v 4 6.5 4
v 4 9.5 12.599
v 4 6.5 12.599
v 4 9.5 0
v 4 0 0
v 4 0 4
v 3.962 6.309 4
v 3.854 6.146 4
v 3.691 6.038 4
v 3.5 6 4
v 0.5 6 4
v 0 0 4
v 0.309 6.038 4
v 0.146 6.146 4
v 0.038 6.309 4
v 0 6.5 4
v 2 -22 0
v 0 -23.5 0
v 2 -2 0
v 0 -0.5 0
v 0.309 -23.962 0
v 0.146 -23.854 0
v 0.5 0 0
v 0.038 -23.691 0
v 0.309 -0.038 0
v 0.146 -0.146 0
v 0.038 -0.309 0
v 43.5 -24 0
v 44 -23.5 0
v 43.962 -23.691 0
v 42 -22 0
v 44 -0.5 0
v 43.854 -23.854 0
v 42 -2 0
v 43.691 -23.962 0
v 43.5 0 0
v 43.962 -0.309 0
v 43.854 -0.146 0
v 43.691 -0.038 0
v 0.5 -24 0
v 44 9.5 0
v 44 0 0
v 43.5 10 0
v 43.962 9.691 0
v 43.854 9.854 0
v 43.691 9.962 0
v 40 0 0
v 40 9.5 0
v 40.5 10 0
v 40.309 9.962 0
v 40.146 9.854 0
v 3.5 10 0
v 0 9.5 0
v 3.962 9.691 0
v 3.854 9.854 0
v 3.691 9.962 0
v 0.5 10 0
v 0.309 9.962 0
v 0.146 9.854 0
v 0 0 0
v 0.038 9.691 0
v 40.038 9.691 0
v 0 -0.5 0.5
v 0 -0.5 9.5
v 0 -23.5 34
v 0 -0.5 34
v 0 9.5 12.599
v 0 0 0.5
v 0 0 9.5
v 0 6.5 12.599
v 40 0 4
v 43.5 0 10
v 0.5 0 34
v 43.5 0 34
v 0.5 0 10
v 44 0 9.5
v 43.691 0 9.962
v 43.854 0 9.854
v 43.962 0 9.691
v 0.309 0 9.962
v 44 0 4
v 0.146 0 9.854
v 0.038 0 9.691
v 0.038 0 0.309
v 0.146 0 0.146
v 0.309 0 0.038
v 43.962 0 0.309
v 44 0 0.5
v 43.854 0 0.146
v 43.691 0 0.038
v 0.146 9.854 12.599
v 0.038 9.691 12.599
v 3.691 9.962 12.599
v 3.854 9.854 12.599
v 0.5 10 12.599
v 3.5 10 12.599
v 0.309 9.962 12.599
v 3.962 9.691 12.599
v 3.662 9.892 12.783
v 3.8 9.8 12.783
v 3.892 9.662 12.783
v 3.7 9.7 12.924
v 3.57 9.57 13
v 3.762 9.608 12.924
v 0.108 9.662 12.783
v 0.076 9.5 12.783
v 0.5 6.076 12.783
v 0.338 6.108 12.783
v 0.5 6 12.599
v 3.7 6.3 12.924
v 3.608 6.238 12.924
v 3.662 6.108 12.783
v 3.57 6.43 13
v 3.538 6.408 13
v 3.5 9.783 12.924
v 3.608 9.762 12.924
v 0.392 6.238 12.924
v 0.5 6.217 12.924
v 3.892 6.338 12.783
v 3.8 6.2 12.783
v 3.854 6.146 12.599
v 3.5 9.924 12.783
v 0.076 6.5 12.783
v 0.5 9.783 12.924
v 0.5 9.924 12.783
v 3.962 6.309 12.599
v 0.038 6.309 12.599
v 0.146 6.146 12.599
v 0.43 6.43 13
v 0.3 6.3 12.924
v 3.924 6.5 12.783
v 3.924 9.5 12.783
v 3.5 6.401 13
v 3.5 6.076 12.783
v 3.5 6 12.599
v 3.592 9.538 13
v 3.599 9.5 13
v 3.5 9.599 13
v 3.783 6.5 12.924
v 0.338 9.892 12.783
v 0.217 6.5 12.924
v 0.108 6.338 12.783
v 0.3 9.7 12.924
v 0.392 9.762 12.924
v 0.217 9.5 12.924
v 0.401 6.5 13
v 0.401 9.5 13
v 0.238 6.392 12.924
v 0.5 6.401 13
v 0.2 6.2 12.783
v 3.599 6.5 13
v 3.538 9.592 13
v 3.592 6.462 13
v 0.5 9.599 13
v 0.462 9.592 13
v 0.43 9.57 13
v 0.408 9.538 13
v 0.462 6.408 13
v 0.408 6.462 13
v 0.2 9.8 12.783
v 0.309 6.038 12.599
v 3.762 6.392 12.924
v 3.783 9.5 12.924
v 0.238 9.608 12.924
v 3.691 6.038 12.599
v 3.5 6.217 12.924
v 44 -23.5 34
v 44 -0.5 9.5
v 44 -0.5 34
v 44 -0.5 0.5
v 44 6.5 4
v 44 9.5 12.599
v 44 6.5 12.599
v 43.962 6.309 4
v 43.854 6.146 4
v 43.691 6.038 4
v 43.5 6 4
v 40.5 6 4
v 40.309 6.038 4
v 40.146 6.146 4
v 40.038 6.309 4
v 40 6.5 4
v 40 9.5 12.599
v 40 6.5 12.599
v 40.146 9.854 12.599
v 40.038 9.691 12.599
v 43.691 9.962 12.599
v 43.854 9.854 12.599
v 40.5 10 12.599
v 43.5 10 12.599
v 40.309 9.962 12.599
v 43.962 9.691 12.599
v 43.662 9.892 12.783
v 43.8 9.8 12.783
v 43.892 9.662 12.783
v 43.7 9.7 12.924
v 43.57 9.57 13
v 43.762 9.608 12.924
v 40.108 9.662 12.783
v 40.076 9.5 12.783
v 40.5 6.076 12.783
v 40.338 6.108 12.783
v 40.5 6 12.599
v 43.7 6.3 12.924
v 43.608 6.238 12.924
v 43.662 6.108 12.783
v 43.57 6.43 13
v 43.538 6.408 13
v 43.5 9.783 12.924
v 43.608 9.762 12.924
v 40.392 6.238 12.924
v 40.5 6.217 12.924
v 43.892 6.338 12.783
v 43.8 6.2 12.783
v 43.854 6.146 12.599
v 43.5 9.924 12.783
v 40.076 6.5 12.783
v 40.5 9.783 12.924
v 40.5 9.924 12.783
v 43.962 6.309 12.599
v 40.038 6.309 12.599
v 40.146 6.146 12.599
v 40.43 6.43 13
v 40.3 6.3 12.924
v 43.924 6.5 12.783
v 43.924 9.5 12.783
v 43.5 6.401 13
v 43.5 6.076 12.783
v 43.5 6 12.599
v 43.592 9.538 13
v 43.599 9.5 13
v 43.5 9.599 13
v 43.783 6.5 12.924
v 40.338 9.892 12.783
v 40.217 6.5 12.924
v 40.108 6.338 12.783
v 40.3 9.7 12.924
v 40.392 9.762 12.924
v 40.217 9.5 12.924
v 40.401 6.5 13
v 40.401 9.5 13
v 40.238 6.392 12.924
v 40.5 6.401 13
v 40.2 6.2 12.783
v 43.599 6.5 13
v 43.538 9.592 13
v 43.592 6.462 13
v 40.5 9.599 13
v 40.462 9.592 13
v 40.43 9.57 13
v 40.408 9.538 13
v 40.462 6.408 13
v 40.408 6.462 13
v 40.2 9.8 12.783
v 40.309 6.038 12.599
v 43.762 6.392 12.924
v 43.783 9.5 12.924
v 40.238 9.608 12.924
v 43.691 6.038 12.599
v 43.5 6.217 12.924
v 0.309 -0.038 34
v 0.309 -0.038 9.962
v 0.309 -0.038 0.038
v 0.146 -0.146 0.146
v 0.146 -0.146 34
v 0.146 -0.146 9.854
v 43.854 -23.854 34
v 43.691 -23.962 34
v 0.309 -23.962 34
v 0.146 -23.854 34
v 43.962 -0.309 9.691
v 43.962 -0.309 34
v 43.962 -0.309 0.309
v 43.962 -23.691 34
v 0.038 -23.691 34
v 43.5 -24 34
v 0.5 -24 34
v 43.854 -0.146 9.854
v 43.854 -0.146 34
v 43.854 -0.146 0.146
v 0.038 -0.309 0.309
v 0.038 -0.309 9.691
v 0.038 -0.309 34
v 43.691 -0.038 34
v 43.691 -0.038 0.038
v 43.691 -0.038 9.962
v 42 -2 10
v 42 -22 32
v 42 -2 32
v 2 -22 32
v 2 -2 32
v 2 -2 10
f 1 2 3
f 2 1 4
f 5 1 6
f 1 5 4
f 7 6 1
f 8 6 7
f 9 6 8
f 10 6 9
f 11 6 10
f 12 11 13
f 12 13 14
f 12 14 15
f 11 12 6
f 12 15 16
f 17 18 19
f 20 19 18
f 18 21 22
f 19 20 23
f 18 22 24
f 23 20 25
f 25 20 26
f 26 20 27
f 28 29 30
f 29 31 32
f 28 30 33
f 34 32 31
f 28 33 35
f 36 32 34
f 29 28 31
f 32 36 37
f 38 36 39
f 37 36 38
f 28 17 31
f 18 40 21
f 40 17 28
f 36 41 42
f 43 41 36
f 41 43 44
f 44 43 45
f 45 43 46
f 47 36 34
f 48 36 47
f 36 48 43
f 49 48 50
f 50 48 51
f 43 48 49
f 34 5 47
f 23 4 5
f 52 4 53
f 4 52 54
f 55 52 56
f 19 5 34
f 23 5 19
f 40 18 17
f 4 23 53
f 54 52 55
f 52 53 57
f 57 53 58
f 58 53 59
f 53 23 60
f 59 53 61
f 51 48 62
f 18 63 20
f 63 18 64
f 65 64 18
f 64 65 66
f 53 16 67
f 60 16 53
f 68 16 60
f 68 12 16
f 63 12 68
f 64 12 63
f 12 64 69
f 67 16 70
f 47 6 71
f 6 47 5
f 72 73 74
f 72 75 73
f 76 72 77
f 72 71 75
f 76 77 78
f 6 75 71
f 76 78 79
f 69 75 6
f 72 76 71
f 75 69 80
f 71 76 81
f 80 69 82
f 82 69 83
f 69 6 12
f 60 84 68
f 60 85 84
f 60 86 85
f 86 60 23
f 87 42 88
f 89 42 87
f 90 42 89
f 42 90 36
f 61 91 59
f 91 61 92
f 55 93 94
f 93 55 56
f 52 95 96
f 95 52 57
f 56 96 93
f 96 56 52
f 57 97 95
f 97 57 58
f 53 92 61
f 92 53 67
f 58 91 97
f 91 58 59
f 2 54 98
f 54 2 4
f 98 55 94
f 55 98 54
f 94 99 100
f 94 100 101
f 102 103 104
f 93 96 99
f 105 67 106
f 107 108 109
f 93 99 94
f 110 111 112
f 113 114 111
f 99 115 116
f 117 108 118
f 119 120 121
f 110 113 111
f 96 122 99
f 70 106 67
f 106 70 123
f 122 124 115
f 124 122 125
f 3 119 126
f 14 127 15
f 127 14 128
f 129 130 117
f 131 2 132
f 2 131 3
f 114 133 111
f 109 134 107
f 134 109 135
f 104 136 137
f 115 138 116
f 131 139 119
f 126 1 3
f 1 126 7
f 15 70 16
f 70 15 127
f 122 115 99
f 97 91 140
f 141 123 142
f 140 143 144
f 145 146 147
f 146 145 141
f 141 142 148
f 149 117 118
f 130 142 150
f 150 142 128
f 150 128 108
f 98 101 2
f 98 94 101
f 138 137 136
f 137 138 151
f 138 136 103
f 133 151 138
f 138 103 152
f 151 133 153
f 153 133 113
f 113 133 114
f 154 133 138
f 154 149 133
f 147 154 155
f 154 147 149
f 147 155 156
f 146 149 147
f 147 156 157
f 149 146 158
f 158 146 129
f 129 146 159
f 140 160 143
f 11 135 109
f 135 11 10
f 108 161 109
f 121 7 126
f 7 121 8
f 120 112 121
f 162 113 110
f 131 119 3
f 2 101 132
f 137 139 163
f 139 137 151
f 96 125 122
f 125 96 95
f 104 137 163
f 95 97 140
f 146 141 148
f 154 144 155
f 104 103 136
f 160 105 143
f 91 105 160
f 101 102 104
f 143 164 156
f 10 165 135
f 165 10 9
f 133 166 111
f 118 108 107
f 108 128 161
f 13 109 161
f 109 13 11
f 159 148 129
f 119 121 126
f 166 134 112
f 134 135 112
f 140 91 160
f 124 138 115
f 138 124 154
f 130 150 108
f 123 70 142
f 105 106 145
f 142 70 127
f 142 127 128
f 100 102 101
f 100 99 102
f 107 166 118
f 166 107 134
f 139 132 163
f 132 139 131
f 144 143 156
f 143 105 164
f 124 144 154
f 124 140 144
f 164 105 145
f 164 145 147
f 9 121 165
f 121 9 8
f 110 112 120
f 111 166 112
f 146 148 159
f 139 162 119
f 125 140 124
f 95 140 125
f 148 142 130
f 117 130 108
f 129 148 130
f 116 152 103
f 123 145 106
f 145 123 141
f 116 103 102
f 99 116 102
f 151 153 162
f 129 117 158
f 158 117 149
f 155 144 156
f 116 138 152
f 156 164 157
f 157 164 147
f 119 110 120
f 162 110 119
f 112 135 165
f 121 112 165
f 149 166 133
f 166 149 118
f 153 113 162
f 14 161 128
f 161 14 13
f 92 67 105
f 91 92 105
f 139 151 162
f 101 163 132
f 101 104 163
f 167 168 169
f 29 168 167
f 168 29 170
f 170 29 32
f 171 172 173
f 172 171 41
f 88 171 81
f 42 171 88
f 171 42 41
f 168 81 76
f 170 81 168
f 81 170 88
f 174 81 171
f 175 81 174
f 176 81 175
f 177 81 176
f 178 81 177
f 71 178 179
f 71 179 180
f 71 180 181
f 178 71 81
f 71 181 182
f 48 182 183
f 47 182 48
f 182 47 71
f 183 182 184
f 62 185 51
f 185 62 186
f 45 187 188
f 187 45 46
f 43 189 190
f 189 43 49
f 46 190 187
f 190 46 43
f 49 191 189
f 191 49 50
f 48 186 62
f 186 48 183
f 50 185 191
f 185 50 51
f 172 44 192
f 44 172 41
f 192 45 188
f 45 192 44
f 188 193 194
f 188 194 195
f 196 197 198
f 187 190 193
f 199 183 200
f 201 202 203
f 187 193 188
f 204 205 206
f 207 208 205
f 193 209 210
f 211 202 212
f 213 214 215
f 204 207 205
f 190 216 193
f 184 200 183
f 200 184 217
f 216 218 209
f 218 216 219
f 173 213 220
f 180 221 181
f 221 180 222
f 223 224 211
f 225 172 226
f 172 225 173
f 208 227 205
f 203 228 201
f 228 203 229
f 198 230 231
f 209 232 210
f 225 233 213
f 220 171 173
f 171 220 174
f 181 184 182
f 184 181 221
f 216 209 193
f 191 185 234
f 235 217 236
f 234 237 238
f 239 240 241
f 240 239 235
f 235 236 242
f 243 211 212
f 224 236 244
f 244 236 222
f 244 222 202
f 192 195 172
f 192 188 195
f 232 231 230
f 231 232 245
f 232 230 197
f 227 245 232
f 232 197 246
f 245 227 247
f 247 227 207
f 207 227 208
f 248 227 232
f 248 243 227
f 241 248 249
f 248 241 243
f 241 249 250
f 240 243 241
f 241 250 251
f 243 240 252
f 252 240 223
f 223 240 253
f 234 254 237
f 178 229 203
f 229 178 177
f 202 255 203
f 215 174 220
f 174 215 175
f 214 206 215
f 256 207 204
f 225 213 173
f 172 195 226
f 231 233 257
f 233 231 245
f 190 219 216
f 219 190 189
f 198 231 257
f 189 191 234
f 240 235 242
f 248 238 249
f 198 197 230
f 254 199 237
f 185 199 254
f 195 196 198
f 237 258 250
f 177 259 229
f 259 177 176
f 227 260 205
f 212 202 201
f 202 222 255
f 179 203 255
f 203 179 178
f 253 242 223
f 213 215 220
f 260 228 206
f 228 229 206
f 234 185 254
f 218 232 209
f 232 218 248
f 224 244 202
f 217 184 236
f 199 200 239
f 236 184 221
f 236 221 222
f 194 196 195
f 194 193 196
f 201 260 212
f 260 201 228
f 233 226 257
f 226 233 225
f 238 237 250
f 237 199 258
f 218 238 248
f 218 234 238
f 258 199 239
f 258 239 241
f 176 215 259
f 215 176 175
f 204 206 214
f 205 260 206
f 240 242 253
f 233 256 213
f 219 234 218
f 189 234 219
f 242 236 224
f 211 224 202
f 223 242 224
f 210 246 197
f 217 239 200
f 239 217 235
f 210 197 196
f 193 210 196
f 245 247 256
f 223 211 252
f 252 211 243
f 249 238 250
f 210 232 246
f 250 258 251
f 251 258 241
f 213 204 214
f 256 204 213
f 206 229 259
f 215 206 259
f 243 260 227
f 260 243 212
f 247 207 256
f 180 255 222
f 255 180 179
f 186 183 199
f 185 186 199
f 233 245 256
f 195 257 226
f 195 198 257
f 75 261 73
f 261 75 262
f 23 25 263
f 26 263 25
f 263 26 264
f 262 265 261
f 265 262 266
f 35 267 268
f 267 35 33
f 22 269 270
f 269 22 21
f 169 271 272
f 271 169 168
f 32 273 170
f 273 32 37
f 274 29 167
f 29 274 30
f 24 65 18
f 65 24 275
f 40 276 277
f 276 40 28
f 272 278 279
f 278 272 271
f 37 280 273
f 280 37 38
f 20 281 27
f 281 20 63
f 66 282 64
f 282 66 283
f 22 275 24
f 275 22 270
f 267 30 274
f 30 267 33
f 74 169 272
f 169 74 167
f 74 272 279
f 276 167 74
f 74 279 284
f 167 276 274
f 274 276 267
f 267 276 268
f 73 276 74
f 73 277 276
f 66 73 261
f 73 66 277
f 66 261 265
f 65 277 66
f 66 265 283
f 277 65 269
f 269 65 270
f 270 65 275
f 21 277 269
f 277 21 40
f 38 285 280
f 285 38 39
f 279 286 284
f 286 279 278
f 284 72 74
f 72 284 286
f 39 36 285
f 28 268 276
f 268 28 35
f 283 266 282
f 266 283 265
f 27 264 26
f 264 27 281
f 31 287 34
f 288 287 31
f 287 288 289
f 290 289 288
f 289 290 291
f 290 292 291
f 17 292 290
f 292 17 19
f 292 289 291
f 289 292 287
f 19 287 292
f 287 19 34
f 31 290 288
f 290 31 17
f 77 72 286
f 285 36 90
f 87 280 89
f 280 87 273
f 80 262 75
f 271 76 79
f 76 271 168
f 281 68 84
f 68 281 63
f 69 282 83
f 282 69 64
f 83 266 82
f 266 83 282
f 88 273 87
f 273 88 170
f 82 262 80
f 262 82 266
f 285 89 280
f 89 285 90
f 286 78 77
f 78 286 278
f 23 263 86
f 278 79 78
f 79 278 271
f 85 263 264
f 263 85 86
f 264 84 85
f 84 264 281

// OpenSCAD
// You only need to edit the varibales prefixed with user_

// The box inner length / depth in mm
user_inner_box_length = 20; // [1:300]
// The box inner height in mm
user_inner_box_height = 30 ; // [1:300]
// The box inner width in mm
user_inner_box_width = 40; // [1:300]
// The box wall width in mm
user_wall_width = 2; // [1:10]
// The minimum number of hooks
user_min_hook_count = 2; // [2:20]

// You can stop editing after this line if you do not want to brick this script ;) 

if (version()[0] < 2019) {
  echo("WARNING: This script is only tested with 2019.01!");
}

assert(undef != user_inner_box_length, "Value \"user_inner_box_length\" must be specified!");
assert(user_inner_box_length >= 1, "The minimum value is 1mm!");
assert(user_inner_box_length <= 300, "The maximum value is 300mm!");

assert(undef != user_inner_box_height, "Value \"user_inner_box_height\" must be specified!");
assert(user_inner_box_height >= 1, "The minimum value is 1mm!");
assert(user_inner_box_height <= 300, "The maximum value is 300mm!");

assert(undef != user_inner_box_width, "Value \"user_inner_box_width\" must be specified!");
assert(user_inner_box_width >= 1, "The minimum value is 1mm!");
assert(user_inner_box_width <= 300, "The maximum value is 300mm!");

assert(undef != user_wall_width, "Value \"user_wall_width\" must be specified!");
assert(user_wall_width >= 1, "The minimum value is 1mm!");
assert(user_wall_width <= 10, "The maximum value is 10mm!");

assert(undef != user_min_hook_count, "Value \"user_min_hook_count\" must be specified!");
assert(user_min_hook_count >= 2);
assert(user_min_hook_count <= 20);

caco_create_ikea_skadis_box(
  user_inner_box_length, 
  user_inner_box_height, 
  user_inner_box_width, 
  user_wall_width,
  (user_min_hook_count - 1) * 40
);

/*
 * License: MIT License
 * 
 * Copyright (c) 2019 "Guido Krömer" <mail@cacodaemon.de>
 * 
 * Permission is hereby granted, free of charge, to any person obtaining a copy of this software and associated documentation files (the "Software"), to deal in the Software without restriction, including without limitation the rights to use, copy, modify, merge, publish, distribute, sublicense, and/or sell copies of the Software, and to permit persons to whom the Software is furnished to do so, subject to the following conditions:
 * 
 * The above copyright notice and this permission notice shall be included in all copies or substantial portions of the Software.
 * 
 * THE SOFTWARE IS PROVIDED "AS IS", WITHOUT WARRANTY OF ANY KIND, EXPRESS OR IMPLIED, INCLUDING BUT NOT LIMITED TO THE WARRANTIES OF MERCHANTABILITY, FITNESS FOR A PARTICULAR PURPOSE AND NONINFRINGEMENT. IN NO EVENT SHALL THE AUTHORS OR COPYRIGHT HOLDERS BE LIABLE FOR ANY CLAIM, DAMAGES OR OTHER LIABILITY, WHETHER IN AN ACTION OF CONTRACT, TORT OR OTHERWISE, ARISING FROM, OUT OF OR IN CONNECTION WITH THE SOFTWARE OR THE USE OR OTHER DEALINGS IN THE SOFTWARE. 
 */
module caco_create_rounded_corner_cube(size, radius = 1, resolution = 5, mode = "all_sides") { 
  half_radius = radius / 2;

  if (mode == "all_sides") {
    translate([half_radius, half_radius, half_radius]) 
    minkowski() { 
      resize(newsize = [radius, radius, radius]) 
      sphere(r = resolution);
      cube([size[0] - radius, size[1] - radius, size[2] - radius], false);
    }
  } else if (mode == "vertical_sides") {
    translate([half_radius, half_radius, 0]) 
    minkowski() { 
      resize(newsize = [radius, radius, radius]) 
      cylinder(r = resolution, h = resolution);
      cube([size[0] - radius, size[1] - radius, size[2] - radius], false);
    }
  } else if (mode == "horizontal_sides") {
    translate([half_radius, radius, half_radius]) 
    minkowski() { 
      resize(newsize = [radius, radius, radius]) 
      rotate([90,0,0]) 
      cylinder(r = resolution, h = resolution);
      cube([size[0] - radius, size[1] - radius, size[2] - radius], false);
    }
  } else {
    cube(size);
  }
}

module caco_create_hollow_rounded_corner_cube_vertical_sides(size, radius = 1, resolution = 5, wall_width = 1.5) {
  difference() {
    caco_create_rounded_corner_cube(size = size, radius = radius, resolution = resolution, mode = "vertical_sides");
    translate([wall_width, wall_width, -wall_width]) 
    cube([size[0] - wall_width * 2, size[1] - wall_width * 2, size[2]]);
  }
}

module caco_create_hook(side_lenght, length) {
  union() {
    cube([side_lenght, side_lenght, side_lenght]);
    caco_create_rounded_corner_cube([side_lenght, length, side_lenght], mode = "vertical_sides");
    translate([0, length - side_lenght, side_lenght - 1]) 
    caco_create_rounded_corner_cube([side_lenght, side_lenght, length]);
  }
}
   
module caco_create_hooks(width, hook_side_lenght, hook_length = 10) {
  union() {
    for(variable = [0 : 40 : width]) {
      translate([variable, 0, 0]) 
      caco_create_hook(side_lenght = hook_side_lenght, length = hook_length);
    }
  }
}

module caco_create_ikea_skadis_box(inner_box_length, inner_box_height, inner_box_width, wall_width = 1, static_slot_distance = 40, static_hook_side_lengt = 4) {
  box_length = inner_box_length + wall_width * 2;
  box_height = inner_box_height + wall_width * 2;
  box_width = inner_box_width + wall_width * 2;
  box_width_back = max([static_slot_distance, box_width]);
  offset = ((box_width_back - (floor(box_width_back/static_slot_distance)*static_slot_distance)) / 2) - (static_hook_side_lengt/2);
  
  render() {
    translate([offset, 0, 0]) 
    caco_create_hooks(width = box_width_back, hook_side_lenght = static_hook_side_lengt);

    translate([offset, -wall_width, 0]) 
    caco_create_rounded_corner_cube([box_width_back - offset * 2, wall_width, max(min(box_height, 10), 10)], radius = wall_width / 2, mode = "horizontal_sides");

    translate([(box_width_back - box_width)/2, -box_length, 0]) 
    caco_create_hollow_rounded_corner_cube_vertical_sides([box_width, box_length, box_height], wall_width = wall_width);
  }
}
